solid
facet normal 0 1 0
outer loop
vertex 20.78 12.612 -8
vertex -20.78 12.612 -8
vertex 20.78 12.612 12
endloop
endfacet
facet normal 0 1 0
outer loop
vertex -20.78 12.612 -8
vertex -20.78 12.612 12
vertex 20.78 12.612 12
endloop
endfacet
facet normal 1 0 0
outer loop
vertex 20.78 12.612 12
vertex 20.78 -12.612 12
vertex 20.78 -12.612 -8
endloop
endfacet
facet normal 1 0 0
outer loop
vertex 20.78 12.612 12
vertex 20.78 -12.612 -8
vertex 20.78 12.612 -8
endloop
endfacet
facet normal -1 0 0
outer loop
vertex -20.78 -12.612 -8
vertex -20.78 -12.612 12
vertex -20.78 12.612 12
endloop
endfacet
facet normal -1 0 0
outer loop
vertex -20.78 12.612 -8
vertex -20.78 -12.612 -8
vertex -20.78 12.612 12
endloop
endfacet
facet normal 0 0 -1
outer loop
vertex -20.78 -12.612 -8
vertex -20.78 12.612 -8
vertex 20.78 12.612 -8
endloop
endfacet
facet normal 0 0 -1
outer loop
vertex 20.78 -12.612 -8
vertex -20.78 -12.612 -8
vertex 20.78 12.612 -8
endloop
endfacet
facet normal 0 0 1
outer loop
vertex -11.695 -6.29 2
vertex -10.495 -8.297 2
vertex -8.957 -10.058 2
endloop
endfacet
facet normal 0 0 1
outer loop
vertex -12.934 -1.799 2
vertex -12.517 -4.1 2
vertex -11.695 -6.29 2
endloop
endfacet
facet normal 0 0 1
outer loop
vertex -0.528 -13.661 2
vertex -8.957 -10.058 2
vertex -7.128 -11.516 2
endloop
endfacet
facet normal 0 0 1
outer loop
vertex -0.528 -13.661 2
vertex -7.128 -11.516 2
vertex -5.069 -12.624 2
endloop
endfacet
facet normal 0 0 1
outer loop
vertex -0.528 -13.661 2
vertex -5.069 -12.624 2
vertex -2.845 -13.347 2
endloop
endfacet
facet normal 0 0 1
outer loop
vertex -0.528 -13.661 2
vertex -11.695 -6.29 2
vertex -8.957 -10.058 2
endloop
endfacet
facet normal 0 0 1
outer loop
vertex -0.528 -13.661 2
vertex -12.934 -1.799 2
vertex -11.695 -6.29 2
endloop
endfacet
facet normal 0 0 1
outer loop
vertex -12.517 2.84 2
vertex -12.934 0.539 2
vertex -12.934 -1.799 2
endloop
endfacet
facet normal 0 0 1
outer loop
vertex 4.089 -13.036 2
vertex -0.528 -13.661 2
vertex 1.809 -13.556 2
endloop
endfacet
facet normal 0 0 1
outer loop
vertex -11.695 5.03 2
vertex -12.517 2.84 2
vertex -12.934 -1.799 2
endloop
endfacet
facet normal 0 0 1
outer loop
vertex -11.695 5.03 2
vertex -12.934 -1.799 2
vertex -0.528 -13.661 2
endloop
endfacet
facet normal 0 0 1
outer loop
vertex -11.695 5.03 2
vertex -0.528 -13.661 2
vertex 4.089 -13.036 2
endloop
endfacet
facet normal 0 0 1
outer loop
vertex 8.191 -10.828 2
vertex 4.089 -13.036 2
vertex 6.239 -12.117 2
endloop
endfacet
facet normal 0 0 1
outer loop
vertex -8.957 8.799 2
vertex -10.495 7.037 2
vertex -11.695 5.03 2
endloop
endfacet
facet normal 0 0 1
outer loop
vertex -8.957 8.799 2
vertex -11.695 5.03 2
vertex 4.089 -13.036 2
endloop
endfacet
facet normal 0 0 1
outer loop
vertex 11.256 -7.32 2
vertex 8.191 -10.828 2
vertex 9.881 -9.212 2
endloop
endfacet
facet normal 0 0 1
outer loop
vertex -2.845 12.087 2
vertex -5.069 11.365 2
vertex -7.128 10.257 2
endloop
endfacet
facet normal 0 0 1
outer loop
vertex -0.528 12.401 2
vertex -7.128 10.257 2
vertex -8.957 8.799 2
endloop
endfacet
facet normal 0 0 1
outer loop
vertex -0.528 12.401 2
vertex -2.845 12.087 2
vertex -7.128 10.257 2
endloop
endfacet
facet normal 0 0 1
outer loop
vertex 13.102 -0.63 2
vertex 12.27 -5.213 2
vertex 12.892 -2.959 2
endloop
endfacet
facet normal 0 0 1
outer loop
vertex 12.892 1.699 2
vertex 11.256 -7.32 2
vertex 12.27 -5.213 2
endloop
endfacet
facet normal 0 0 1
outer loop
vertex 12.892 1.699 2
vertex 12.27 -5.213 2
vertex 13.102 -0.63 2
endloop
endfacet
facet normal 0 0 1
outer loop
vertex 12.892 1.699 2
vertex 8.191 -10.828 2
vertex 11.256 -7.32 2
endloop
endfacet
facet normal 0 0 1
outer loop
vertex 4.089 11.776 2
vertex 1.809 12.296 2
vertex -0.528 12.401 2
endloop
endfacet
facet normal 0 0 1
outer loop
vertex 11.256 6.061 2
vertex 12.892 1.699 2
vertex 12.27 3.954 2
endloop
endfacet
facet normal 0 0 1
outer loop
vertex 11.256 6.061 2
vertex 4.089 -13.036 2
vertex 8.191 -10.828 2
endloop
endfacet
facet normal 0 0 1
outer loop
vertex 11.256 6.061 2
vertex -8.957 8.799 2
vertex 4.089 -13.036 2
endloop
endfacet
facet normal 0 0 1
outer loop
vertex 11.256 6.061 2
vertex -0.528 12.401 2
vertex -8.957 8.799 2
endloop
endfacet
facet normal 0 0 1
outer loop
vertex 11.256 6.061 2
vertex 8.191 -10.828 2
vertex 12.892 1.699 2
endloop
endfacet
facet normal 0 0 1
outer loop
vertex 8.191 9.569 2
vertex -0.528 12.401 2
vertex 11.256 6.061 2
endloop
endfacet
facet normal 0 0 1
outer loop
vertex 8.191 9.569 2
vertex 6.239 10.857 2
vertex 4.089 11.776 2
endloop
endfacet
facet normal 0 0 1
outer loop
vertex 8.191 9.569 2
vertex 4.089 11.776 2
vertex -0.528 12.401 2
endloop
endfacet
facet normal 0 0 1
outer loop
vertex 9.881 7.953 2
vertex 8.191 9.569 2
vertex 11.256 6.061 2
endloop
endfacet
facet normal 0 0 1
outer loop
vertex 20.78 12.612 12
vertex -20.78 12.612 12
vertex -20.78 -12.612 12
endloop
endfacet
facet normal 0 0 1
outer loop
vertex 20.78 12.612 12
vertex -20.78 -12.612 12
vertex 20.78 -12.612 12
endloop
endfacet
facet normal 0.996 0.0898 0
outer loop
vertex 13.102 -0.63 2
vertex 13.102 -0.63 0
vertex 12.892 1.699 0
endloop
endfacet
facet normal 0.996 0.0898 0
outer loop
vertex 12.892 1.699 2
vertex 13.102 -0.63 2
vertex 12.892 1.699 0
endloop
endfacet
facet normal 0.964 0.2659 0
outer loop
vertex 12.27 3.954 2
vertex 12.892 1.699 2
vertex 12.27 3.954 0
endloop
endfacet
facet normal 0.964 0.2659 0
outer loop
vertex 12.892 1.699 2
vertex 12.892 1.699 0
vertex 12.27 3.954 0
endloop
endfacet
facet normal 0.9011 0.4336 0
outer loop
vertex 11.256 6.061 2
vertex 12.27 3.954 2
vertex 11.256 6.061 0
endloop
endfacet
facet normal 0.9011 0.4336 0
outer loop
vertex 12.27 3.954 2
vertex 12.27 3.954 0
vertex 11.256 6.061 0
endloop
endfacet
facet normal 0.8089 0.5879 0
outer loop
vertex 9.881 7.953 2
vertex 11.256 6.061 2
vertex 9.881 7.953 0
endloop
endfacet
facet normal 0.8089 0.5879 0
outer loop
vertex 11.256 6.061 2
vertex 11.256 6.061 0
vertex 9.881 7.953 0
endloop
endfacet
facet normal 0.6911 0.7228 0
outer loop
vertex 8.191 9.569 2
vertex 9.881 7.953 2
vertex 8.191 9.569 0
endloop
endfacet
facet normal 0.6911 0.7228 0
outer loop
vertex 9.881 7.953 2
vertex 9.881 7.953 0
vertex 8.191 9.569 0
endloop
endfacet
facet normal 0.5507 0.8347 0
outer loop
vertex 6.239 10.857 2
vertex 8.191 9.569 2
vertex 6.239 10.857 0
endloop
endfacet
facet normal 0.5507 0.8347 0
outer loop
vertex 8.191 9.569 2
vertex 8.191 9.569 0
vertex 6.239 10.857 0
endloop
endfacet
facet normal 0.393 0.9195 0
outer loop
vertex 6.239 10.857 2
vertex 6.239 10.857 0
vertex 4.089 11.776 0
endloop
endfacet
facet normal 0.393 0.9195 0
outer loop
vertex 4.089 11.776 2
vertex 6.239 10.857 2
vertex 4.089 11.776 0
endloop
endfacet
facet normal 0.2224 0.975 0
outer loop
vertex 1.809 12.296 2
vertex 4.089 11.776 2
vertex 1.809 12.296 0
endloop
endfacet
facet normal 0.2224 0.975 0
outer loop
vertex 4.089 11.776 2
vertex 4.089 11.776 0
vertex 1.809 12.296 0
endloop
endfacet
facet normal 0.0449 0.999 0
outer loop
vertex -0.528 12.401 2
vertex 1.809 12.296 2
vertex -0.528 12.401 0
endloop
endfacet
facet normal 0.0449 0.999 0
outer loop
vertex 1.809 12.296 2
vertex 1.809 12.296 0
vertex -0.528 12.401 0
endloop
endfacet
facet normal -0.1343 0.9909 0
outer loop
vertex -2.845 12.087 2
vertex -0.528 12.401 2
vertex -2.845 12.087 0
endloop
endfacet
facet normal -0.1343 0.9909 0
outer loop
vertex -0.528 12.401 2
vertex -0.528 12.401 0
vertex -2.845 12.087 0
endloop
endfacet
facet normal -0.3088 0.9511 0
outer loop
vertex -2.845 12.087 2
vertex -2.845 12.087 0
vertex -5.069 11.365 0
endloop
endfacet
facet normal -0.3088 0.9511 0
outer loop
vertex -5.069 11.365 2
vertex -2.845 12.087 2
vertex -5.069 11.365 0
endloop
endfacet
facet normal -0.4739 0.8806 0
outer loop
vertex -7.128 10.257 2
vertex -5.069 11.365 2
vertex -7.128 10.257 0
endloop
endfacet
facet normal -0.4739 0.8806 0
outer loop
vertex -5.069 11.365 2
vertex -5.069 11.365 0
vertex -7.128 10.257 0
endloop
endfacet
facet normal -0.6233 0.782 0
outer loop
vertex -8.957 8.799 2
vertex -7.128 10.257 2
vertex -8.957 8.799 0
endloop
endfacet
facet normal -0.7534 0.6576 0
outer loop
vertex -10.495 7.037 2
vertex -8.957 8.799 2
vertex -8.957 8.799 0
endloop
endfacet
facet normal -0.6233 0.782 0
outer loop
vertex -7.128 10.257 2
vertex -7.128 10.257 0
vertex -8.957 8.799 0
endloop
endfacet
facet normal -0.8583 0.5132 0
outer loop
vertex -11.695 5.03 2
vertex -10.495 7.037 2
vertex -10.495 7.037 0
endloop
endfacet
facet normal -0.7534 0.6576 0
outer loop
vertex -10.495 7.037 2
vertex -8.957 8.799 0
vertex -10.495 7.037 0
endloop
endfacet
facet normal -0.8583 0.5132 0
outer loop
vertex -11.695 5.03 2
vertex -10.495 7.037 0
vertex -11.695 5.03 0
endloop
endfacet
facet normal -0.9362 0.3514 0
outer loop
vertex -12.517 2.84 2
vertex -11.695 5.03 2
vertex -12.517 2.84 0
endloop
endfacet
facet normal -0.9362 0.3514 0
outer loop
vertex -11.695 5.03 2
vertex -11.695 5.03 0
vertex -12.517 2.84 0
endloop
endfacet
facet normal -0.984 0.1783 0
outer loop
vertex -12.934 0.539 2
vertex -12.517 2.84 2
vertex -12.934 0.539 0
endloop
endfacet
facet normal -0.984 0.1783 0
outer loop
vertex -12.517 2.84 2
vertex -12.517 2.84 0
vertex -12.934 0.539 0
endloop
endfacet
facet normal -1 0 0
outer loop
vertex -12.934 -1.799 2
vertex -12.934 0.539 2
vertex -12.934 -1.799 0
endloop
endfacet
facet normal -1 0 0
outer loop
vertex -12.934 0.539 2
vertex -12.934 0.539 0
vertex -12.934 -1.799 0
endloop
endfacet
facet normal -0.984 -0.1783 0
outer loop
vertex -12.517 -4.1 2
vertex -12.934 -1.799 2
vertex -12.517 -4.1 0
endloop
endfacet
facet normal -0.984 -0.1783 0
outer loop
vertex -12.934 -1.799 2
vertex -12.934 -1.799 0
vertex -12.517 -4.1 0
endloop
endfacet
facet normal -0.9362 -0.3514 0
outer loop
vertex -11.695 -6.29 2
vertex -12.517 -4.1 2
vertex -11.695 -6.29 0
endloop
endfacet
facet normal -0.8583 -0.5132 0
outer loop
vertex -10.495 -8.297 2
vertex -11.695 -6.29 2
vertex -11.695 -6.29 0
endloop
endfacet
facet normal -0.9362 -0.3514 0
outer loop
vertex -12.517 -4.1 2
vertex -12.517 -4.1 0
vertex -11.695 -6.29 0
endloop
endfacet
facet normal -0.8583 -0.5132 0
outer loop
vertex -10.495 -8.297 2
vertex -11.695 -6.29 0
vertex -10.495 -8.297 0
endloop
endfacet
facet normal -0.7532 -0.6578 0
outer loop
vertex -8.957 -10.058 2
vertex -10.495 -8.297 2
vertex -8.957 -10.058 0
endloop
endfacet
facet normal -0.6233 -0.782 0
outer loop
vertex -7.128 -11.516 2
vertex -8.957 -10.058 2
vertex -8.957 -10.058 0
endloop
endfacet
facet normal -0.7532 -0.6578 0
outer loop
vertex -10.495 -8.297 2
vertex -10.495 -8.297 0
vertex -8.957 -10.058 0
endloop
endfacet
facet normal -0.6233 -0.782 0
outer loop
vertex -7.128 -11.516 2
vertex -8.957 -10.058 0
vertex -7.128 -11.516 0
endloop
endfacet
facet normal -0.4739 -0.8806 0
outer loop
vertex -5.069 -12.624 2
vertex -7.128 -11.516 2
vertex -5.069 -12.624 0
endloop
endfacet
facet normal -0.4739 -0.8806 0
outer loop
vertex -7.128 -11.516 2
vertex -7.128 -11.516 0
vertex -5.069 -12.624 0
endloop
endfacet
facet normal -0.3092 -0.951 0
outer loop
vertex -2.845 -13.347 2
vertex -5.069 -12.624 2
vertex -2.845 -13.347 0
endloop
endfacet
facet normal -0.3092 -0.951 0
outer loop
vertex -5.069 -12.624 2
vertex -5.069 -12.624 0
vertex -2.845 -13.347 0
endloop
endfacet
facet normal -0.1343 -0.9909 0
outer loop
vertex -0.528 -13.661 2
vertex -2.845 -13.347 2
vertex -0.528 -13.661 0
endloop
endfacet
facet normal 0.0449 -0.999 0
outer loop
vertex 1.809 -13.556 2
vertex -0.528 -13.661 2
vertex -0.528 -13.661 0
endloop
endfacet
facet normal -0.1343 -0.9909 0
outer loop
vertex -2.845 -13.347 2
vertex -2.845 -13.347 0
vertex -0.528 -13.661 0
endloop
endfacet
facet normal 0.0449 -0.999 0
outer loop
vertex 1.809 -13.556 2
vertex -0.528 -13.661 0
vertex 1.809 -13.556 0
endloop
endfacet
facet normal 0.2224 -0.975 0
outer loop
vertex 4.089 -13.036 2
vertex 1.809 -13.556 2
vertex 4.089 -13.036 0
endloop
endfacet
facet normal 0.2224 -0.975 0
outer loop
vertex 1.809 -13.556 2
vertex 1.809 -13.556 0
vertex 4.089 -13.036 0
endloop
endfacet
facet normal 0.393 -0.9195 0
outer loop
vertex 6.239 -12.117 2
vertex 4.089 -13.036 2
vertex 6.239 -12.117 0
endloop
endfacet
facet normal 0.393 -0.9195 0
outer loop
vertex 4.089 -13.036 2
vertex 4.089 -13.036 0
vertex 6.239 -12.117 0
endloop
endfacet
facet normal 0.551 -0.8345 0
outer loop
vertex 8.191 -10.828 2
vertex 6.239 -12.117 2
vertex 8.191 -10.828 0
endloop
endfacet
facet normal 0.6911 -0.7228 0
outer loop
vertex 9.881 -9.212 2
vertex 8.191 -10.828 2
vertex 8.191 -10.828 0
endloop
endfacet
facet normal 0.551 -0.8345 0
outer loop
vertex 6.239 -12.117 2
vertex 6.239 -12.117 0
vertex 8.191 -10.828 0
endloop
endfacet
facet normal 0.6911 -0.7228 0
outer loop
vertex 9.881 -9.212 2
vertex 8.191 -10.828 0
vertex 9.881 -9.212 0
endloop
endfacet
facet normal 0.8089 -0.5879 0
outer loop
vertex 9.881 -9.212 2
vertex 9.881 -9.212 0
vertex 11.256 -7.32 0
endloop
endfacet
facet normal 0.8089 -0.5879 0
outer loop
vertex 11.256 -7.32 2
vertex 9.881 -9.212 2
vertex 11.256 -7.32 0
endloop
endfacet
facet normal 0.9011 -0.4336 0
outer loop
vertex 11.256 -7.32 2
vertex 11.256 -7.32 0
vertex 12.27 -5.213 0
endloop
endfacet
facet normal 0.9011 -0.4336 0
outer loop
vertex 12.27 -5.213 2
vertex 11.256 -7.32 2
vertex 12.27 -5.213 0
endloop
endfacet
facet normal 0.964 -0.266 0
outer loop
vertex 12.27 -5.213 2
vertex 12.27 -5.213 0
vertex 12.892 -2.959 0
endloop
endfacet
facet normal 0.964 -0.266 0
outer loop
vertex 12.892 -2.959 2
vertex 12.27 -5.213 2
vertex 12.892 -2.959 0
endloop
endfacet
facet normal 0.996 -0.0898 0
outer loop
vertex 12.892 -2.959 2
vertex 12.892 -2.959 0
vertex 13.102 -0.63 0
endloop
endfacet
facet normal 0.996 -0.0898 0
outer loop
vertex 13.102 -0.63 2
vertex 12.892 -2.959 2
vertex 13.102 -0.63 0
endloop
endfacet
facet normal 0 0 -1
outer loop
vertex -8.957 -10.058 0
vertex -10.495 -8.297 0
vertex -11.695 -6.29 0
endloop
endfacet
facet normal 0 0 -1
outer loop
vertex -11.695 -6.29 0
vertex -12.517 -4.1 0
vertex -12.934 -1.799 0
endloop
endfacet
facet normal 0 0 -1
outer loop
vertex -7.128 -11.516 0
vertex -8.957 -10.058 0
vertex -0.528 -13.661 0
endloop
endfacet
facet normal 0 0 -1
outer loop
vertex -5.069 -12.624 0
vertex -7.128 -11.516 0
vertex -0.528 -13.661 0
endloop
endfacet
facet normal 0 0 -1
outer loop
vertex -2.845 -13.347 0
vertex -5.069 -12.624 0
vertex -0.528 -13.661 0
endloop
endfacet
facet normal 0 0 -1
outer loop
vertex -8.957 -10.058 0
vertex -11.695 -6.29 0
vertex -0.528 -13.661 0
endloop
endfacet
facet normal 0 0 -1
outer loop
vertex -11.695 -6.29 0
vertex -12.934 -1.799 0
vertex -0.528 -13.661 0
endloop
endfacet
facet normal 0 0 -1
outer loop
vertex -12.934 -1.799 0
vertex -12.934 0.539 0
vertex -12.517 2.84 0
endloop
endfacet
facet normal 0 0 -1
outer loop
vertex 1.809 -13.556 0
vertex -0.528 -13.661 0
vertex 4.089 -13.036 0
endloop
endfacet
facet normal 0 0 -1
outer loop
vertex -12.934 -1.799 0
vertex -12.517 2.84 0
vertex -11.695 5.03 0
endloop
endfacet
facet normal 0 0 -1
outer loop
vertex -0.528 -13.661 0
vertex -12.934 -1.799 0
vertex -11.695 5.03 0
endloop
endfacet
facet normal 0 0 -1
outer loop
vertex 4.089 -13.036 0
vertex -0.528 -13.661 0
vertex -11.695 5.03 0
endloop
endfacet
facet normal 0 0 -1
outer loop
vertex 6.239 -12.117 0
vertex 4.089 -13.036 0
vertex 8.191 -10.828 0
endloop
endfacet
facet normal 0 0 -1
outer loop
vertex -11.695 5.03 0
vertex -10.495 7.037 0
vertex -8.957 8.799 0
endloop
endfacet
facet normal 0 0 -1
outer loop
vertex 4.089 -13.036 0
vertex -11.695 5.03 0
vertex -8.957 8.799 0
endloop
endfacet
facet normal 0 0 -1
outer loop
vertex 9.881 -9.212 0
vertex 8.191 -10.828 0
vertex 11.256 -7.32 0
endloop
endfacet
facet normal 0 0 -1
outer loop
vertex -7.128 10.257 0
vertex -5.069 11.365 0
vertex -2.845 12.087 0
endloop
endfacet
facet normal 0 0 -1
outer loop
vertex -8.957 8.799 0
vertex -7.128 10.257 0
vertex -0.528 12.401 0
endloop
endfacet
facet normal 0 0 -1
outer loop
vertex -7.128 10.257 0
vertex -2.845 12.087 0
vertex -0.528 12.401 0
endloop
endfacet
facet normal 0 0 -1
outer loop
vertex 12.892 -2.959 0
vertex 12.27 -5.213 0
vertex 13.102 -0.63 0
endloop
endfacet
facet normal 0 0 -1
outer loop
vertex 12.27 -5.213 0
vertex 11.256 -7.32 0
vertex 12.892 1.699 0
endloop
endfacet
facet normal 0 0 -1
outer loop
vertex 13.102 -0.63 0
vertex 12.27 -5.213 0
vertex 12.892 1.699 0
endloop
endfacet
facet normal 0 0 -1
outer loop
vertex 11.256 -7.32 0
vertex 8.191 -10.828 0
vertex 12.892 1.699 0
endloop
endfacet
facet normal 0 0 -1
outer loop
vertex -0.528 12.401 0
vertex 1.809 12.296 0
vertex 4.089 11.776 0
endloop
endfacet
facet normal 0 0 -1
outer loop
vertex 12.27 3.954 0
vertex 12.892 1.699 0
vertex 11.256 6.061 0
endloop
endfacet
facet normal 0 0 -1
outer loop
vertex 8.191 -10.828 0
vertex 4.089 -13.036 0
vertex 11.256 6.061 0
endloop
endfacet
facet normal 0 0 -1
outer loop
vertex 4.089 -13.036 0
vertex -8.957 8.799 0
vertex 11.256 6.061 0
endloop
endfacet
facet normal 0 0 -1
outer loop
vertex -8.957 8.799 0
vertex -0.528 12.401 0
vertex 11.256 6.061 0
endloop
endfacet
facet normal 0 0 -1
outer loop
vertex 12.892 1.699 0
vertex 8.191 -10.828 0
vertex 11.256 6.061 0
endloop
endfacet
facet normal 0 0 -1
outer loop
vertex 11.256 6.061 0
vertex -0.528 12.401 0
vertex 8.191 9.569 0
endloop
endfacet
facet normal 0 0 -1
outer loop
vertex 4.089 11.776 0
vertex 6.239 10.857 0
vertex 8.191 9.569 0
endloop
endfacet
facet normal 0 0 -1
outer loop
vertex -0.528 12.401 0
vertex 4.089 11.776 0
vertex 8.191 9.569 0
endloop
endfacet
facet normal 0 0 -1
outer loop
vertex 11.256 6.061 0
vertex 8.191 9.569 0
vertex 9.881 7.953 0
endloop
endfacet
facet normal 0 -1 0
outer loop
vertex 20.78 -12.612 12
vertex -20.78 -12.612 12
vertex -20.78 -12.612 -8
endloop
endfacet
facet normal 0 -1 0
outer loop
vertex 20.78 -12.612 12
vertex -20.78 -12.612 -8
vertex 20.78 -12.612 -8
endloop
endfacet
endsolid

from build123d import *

# Parameters (mm, degrees)
SKETCH1_R           = 13.044310864
BOSS_EXTRUDE1_DEPTH = 2
SKETCH2_W           = 41.559490096
SKETCH2_H           = 25.224294724
BOSS_EXTRUDE2_DEPTH = 10


with BuildPart() as part:
    # Sketch1 → Boss-Extrude1 (new body)
    with BuildSketch(Plane.XY):
        with Locations((0.057673109, -0.629813302)):
            Circle(SKETCH1_R)
    extrude(amount=BOSS_EXTRUDE1_DEPTH)


with BuildPart() as body_2:
    # Sketch2 → Boss-Extrude2 (new, symmetric)
    with BuildSketch(Plane.XY.offset(2)):
        Rectangle(SKETCH2_W, SKETCH2_H)
    extrude(amount=BOSS_EXTRUDE2_DEPTH, both=True)


solid = Compound([part.part, body_2.part])
